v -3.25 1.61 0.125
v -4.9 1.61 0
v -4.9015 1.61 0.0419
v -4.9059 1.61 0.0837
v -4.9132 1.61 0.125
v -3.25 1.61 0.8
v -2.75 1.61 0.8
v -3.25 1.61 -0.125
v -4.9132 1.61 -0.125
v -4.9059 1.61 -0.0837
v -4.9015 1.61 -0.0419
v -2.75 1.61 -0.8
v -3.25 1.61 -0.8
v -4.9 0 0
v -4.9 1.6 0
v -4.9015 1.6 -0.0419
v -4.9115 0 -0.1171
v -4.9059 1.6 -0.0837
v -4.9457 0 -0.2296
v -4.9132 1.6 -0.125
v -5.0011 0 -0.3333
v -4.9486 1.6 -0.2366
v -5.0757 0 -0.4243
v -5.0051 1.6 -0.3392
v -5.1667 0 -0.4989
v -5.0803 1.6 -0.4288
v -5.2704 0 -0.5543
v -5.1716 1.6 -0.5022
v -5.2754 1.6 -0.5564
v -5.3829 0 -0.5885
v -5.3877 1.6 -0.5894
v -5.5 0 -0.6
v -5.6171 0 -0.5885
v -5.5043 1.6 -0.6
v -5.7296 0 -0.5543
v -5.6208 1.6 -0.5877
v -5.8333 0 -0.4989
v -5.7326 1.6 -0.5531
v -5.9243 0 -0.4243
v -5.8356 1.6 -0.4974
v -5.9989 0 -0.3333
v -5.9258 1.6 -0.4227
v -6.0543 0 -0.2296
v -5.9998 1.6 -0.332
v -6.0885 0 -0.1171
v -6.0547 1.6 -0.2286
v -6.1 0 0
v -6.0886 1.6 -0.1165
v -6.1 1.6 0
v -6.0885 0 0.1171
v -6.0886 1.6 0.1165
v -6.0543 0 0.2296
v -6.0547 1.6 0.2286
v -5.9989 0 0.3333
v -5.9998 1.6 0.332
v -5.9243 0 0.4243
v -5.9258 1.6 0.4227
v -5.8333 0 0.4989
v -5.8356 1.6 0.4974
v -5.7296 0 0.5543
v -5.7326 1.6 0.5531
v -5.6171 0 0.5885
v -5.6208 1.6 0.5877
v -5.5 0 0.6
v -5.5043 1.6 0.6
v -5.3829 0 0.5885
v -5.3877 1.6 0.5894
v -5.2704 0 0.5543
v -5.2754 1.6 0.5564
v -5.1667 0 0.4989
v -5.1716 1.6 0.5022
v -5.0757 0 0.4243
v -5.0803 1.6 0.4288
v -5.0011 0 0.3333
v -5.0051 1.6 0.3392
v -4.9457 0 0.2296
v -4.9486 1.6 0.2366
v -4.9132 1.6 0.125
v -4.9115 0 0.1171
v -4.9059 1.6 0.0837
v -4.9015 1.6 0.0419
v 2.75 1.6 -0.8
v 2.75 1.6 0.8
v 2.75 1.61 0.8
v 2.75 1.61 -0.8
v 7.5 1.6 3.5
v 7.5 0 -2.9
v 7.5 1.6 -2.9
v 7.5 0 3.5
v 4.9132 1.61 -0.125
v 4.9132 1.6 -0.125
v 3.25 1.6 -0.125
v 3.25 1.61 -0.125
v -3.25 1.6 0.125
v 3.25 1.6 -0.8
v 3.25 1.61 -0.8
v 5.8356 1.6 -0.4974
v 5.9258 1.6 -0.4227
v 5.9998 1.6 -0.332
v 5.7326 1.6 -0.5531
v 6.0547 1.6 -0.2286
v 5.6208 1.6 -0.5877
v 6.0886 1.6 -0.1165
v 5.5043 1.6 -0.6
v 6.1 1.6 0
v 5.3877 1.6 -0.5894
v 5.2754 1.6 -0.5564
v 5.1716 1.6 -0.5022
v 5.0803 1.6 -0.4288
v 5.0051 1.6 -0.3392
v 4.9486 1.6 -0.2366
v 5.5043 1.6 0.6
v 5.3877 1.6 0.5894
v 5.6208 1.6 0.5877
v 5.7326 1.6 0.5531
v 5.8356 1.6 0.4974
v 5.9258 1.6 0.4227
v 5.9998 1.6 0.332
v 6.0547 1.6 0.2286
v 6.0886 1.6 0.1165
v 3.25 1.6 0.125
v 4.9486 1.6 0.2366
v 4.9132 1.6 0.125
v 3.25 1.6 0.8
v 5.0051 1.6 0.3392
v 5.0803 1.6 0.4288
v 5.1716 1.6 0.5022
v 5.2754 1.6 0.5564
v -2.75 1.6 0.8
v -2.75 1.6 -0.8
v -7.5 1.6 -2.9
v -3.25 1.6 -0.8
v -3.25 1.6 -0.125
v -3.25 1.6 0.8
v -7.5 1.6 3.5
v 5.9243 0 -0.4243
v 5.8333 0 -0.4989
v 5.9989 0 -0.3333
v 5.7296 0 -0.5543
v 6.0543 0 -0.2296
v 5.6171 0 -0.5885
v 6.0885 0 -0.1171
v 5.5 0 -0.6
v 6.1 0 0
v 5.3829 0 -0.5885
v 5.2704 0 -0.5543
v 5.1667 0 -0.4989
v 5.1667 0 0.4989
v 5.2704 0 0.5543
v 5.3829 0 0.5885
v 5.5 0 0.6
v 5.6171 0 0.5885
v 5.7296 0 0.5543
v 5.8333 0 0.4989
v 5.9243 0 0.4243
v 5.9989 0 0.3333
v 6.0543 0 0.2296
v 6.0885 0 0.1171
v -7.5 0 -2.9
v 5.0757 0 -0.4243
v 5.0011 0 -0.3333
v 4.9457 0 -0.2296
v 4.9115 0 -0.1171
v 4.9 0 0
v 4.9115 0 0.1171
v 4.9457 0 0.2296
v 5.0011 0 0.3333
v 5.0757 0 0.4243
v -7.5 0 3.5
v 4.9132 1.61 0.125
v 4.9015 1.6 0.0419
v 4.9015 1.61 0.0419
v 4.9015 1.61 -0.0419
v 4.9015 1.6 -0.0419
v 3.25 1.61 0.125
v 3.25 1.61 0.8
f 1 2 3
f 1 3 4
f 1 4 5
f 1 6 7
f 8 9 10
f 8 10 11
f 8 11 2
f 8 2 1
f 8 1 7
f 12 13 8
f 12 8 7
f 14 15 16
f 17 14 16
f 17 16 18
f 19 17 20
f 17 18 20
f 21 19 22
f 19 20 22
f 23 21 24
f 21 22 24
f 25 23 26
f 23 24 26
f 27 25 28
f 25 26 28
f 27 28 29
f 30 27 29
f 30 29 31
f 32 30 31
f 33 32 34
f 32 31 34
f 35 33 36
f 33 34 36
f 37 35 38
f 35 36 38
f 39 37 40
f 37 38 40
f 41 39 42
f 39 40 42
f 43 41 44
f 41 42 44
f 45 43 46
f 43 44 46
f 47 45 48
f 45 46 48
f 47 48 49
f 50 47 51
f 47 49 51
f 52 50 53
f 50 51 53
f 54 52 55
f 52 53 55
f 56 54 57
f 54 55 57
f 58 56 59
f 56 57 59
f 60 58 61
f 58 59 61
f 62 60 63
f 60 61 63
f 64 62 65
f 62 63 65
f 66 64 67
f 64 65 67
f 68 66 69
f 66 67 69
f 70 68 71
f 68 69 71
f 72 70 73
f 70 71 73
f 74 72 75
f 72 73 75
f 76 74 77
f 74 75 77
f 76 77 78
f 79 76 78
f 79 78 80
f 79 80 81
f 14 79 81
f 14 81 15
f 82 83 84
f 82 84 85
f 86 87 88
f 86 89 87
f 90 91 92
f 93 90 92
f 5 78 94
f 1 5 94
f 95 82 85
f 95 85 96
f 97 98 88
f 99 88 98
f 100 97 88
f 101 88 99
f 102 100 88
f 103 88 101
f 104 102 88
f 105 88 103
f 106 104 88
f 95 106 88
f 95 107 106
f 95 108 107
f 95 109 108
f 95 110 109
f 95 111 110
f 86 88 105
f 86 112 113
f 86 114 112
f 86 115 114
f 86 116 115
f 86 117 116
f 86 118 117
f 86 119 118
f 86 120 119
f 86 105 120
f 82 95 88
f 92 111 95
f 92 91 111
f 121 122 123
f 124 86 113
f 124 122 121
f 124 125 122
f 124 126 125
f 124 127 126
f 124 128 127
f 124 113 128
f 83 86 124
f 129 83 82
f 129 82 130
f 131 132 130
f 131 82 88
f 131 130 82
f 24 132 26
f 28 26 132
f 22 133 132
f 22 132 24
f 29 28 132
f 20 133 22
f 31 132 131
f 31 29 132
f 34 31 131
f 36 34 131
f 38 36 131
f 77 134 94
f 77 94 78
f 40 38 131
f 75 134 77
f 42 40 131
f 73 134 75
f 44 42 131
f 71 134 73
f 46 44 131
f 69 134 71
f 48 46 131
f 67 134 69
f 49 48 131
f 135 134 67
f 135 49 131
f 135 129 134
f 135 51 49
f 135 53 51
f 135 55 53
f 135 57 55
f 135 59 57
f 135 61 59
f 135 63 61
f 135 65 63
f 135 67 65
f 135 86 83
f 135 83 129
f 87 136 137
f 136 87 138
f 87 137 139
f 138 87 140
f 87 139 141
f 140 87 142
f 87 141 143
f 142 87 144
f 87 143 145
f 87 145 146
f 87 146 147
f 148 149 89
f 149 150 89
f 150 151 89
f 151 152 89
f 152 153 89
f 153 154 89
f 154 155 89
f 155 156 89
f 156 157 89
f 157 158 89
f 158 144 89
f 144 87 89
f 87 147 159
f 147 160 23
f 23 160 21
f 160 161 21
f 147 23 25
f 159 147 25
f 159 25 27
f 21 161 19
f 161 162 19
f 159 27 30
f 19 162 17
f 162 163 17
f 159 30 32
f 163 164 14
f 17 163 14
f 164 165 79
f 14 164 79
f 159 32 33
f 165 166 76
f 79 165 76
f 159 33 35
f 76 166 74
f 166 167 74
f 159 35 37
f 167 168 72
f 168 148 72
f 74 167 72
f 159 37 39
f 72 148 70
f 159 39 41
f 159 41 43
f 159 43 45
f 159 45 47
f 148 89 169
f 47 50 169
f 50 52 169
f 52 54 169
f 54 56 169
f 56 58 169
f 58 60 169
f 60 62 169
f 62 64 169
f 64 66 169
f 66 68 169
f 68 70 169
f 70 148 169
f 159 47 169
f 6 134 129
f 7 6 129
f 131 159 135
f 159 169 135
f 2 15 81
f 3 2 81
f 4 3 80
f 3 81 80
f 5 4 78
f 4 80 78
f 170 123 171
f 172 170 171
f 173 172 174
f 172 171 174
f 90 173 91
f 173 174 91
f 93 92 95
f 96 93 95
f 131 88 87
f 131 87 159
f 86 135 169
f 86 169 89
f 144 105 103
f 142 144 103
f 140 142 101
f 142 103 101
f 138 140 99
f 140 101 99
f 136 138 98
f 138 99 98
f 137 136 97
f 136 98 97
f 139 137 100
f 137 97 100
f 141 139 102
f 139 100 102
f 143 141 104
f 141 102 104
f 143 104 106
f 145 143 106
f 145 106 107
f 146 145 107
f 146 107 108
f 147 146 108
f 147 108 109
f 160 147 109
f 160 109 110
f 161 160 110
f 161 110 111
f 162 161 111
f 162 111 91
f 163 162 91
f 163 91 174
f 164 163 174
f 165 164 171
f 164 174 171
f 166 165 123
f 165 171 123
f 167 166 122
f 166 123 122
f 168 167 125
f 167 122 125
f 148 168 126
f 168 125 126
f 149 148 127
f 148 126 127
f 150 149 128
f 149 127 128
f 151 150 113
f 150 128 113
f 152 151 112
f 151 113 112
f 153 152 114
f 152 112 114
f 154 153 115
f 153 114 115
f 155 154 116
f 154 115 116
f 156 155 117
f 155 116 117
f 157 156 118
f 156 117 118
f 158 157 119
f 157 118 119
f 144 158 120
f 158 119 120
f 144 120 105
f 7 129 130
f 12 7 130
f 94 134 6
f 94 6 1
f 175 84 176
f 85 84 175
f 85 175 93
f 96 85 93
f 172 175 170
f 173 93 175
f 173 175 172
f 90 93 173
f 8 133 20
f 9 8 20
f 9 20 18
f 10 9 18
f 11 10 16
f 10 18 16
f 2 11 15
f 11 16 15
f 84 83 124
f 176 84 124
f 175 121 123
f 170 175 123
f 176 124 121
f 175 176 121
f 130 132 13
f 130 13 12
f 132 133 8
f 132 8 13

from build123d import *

# Parameters (mm, degrees)
SKETCH1_W           = 15
SKETCH1_H           = 4
BOSS_EXTRUDE1_DEPTH = 1.6
SKETCH3_R           = 0.6
CUT_EXTRUDE1_DEPTH  = 1.6
SKETCH2_W           = 0.5
SKETCH2_H           = 1.6
BOSS_EXTRUDE2_DEPTH = 0.01
BOSS_EXTRUDE3_DEPTH = 0.01
SKETCH5_W           = 15
SKETCH5_H           = 1.6
BOSS_EXTRUDE4_DEPTH = 1.5
SKETCH6_W           = 15
SKETCH6_H           = 1.6
BOSS_EXTRUDE5_DEPTH = 0.9


with BuildPart() as part:
    # Sketch1 → Boss-Extrude1 (new body)
    with BuildSketch(Plane(origin=(0, 0, 0), x_dir=(1, 0, 0), z_dir=(0, 1, 0))):
        Rectangle(SKETCH1_W, SKETCH1_H)
    extrude(amount=BOSS_EXTRUDE1_DEPTH)

    # Sketch3 → Cut-Extrude1 (cut)
    with BuildSketch(Plane(origin=(0, 1.6, 0), x_dir=(1, 0, 0), z_dir=(0, 1, 0))):
        with Locations((5.5, 0)):
            Circle(SKETCH3_R)
        with Locations((-5.5, 0)):
            Circle(SKETCH3_R)
    extrude(amount=-CUT_EXTRUDE1_DEPTH, mode=Mode.SUBTRACT)

    # Sketch2 → Boss-Extrude2 (add)
    with BuildSketch(Plane(origin=(0, 1.6, 0), x_dir=(1, 0, 0), z_dir=(0, 1, 0))):
        with Locations((-3, 0)):
            Rectangle(SKETCH2_W, SKETCH2_H)
        with Locations((3, 0)):
            Rectangle(SKETCH2_W, SKETCH2_H)
    extrude(amount=BOSS_EXTRUDE2_DEPTH)

    # Sketch4 → Boss-Extrude3 (add)
    with BuildSketch(Plane(origin=(0, 1.6, 0), x_dir=(1, 0, 0), z_dir=(0, 1, 0))):
        with BuildLine():
            Line((3.25, -0.125), (4.913165, -0.125))
            ThreePointArc((4.913165, -0.125), (4.9, 0), (4.913165, 0.125))
            Line((4.913165, 0.125), (3.25, 0.125))
            Line((3.25, 0.125), (3.25, -0.125))
        make_face()
        with BuildLine():
            Line((-3.25, 0.125), (-4.913165, 0.125))
            ThreePointArc((-4.913165, 0.125), (-4.9033, 0.062846), (-4.9, 0))
            ThreePointArc((-4.9, 0), (-4.9033, -0.062846), (-4.913165, -0.125))
            Line((-4.913165, -0.125), (-3.25, -0.125))
            Line((-3.25, -0.125), (-3.25, 0.125))
        make_face()
    extrude(amount=BOSS_EXTRUDE3_DEPTH)

    # Sketch5 → Boss-Extrude4 (add)
    with BuildSketch(Plane.XY.offset(2)):
        with Locations((0, 0.8)):
            Rectangle(SKETCH5_W, SKETCH5_H)
    extrude(amount=BOSS_EXTRUDE4_DEPTH)

    # Sketch6 → Boss-Extrude5 (add)
    with BuildSketch(Plane(origin=(0, 0, -2), x_dir=(-1, 0, 0), z_dir=(0, 0, -1))):
        with Locations((0, 0.8)):
            Rectangle(SKETCH6_W, SKETCH6_H)
    extrude(amount=BOSS_EXTRUDE5_DEPTH)


solid = part.part
